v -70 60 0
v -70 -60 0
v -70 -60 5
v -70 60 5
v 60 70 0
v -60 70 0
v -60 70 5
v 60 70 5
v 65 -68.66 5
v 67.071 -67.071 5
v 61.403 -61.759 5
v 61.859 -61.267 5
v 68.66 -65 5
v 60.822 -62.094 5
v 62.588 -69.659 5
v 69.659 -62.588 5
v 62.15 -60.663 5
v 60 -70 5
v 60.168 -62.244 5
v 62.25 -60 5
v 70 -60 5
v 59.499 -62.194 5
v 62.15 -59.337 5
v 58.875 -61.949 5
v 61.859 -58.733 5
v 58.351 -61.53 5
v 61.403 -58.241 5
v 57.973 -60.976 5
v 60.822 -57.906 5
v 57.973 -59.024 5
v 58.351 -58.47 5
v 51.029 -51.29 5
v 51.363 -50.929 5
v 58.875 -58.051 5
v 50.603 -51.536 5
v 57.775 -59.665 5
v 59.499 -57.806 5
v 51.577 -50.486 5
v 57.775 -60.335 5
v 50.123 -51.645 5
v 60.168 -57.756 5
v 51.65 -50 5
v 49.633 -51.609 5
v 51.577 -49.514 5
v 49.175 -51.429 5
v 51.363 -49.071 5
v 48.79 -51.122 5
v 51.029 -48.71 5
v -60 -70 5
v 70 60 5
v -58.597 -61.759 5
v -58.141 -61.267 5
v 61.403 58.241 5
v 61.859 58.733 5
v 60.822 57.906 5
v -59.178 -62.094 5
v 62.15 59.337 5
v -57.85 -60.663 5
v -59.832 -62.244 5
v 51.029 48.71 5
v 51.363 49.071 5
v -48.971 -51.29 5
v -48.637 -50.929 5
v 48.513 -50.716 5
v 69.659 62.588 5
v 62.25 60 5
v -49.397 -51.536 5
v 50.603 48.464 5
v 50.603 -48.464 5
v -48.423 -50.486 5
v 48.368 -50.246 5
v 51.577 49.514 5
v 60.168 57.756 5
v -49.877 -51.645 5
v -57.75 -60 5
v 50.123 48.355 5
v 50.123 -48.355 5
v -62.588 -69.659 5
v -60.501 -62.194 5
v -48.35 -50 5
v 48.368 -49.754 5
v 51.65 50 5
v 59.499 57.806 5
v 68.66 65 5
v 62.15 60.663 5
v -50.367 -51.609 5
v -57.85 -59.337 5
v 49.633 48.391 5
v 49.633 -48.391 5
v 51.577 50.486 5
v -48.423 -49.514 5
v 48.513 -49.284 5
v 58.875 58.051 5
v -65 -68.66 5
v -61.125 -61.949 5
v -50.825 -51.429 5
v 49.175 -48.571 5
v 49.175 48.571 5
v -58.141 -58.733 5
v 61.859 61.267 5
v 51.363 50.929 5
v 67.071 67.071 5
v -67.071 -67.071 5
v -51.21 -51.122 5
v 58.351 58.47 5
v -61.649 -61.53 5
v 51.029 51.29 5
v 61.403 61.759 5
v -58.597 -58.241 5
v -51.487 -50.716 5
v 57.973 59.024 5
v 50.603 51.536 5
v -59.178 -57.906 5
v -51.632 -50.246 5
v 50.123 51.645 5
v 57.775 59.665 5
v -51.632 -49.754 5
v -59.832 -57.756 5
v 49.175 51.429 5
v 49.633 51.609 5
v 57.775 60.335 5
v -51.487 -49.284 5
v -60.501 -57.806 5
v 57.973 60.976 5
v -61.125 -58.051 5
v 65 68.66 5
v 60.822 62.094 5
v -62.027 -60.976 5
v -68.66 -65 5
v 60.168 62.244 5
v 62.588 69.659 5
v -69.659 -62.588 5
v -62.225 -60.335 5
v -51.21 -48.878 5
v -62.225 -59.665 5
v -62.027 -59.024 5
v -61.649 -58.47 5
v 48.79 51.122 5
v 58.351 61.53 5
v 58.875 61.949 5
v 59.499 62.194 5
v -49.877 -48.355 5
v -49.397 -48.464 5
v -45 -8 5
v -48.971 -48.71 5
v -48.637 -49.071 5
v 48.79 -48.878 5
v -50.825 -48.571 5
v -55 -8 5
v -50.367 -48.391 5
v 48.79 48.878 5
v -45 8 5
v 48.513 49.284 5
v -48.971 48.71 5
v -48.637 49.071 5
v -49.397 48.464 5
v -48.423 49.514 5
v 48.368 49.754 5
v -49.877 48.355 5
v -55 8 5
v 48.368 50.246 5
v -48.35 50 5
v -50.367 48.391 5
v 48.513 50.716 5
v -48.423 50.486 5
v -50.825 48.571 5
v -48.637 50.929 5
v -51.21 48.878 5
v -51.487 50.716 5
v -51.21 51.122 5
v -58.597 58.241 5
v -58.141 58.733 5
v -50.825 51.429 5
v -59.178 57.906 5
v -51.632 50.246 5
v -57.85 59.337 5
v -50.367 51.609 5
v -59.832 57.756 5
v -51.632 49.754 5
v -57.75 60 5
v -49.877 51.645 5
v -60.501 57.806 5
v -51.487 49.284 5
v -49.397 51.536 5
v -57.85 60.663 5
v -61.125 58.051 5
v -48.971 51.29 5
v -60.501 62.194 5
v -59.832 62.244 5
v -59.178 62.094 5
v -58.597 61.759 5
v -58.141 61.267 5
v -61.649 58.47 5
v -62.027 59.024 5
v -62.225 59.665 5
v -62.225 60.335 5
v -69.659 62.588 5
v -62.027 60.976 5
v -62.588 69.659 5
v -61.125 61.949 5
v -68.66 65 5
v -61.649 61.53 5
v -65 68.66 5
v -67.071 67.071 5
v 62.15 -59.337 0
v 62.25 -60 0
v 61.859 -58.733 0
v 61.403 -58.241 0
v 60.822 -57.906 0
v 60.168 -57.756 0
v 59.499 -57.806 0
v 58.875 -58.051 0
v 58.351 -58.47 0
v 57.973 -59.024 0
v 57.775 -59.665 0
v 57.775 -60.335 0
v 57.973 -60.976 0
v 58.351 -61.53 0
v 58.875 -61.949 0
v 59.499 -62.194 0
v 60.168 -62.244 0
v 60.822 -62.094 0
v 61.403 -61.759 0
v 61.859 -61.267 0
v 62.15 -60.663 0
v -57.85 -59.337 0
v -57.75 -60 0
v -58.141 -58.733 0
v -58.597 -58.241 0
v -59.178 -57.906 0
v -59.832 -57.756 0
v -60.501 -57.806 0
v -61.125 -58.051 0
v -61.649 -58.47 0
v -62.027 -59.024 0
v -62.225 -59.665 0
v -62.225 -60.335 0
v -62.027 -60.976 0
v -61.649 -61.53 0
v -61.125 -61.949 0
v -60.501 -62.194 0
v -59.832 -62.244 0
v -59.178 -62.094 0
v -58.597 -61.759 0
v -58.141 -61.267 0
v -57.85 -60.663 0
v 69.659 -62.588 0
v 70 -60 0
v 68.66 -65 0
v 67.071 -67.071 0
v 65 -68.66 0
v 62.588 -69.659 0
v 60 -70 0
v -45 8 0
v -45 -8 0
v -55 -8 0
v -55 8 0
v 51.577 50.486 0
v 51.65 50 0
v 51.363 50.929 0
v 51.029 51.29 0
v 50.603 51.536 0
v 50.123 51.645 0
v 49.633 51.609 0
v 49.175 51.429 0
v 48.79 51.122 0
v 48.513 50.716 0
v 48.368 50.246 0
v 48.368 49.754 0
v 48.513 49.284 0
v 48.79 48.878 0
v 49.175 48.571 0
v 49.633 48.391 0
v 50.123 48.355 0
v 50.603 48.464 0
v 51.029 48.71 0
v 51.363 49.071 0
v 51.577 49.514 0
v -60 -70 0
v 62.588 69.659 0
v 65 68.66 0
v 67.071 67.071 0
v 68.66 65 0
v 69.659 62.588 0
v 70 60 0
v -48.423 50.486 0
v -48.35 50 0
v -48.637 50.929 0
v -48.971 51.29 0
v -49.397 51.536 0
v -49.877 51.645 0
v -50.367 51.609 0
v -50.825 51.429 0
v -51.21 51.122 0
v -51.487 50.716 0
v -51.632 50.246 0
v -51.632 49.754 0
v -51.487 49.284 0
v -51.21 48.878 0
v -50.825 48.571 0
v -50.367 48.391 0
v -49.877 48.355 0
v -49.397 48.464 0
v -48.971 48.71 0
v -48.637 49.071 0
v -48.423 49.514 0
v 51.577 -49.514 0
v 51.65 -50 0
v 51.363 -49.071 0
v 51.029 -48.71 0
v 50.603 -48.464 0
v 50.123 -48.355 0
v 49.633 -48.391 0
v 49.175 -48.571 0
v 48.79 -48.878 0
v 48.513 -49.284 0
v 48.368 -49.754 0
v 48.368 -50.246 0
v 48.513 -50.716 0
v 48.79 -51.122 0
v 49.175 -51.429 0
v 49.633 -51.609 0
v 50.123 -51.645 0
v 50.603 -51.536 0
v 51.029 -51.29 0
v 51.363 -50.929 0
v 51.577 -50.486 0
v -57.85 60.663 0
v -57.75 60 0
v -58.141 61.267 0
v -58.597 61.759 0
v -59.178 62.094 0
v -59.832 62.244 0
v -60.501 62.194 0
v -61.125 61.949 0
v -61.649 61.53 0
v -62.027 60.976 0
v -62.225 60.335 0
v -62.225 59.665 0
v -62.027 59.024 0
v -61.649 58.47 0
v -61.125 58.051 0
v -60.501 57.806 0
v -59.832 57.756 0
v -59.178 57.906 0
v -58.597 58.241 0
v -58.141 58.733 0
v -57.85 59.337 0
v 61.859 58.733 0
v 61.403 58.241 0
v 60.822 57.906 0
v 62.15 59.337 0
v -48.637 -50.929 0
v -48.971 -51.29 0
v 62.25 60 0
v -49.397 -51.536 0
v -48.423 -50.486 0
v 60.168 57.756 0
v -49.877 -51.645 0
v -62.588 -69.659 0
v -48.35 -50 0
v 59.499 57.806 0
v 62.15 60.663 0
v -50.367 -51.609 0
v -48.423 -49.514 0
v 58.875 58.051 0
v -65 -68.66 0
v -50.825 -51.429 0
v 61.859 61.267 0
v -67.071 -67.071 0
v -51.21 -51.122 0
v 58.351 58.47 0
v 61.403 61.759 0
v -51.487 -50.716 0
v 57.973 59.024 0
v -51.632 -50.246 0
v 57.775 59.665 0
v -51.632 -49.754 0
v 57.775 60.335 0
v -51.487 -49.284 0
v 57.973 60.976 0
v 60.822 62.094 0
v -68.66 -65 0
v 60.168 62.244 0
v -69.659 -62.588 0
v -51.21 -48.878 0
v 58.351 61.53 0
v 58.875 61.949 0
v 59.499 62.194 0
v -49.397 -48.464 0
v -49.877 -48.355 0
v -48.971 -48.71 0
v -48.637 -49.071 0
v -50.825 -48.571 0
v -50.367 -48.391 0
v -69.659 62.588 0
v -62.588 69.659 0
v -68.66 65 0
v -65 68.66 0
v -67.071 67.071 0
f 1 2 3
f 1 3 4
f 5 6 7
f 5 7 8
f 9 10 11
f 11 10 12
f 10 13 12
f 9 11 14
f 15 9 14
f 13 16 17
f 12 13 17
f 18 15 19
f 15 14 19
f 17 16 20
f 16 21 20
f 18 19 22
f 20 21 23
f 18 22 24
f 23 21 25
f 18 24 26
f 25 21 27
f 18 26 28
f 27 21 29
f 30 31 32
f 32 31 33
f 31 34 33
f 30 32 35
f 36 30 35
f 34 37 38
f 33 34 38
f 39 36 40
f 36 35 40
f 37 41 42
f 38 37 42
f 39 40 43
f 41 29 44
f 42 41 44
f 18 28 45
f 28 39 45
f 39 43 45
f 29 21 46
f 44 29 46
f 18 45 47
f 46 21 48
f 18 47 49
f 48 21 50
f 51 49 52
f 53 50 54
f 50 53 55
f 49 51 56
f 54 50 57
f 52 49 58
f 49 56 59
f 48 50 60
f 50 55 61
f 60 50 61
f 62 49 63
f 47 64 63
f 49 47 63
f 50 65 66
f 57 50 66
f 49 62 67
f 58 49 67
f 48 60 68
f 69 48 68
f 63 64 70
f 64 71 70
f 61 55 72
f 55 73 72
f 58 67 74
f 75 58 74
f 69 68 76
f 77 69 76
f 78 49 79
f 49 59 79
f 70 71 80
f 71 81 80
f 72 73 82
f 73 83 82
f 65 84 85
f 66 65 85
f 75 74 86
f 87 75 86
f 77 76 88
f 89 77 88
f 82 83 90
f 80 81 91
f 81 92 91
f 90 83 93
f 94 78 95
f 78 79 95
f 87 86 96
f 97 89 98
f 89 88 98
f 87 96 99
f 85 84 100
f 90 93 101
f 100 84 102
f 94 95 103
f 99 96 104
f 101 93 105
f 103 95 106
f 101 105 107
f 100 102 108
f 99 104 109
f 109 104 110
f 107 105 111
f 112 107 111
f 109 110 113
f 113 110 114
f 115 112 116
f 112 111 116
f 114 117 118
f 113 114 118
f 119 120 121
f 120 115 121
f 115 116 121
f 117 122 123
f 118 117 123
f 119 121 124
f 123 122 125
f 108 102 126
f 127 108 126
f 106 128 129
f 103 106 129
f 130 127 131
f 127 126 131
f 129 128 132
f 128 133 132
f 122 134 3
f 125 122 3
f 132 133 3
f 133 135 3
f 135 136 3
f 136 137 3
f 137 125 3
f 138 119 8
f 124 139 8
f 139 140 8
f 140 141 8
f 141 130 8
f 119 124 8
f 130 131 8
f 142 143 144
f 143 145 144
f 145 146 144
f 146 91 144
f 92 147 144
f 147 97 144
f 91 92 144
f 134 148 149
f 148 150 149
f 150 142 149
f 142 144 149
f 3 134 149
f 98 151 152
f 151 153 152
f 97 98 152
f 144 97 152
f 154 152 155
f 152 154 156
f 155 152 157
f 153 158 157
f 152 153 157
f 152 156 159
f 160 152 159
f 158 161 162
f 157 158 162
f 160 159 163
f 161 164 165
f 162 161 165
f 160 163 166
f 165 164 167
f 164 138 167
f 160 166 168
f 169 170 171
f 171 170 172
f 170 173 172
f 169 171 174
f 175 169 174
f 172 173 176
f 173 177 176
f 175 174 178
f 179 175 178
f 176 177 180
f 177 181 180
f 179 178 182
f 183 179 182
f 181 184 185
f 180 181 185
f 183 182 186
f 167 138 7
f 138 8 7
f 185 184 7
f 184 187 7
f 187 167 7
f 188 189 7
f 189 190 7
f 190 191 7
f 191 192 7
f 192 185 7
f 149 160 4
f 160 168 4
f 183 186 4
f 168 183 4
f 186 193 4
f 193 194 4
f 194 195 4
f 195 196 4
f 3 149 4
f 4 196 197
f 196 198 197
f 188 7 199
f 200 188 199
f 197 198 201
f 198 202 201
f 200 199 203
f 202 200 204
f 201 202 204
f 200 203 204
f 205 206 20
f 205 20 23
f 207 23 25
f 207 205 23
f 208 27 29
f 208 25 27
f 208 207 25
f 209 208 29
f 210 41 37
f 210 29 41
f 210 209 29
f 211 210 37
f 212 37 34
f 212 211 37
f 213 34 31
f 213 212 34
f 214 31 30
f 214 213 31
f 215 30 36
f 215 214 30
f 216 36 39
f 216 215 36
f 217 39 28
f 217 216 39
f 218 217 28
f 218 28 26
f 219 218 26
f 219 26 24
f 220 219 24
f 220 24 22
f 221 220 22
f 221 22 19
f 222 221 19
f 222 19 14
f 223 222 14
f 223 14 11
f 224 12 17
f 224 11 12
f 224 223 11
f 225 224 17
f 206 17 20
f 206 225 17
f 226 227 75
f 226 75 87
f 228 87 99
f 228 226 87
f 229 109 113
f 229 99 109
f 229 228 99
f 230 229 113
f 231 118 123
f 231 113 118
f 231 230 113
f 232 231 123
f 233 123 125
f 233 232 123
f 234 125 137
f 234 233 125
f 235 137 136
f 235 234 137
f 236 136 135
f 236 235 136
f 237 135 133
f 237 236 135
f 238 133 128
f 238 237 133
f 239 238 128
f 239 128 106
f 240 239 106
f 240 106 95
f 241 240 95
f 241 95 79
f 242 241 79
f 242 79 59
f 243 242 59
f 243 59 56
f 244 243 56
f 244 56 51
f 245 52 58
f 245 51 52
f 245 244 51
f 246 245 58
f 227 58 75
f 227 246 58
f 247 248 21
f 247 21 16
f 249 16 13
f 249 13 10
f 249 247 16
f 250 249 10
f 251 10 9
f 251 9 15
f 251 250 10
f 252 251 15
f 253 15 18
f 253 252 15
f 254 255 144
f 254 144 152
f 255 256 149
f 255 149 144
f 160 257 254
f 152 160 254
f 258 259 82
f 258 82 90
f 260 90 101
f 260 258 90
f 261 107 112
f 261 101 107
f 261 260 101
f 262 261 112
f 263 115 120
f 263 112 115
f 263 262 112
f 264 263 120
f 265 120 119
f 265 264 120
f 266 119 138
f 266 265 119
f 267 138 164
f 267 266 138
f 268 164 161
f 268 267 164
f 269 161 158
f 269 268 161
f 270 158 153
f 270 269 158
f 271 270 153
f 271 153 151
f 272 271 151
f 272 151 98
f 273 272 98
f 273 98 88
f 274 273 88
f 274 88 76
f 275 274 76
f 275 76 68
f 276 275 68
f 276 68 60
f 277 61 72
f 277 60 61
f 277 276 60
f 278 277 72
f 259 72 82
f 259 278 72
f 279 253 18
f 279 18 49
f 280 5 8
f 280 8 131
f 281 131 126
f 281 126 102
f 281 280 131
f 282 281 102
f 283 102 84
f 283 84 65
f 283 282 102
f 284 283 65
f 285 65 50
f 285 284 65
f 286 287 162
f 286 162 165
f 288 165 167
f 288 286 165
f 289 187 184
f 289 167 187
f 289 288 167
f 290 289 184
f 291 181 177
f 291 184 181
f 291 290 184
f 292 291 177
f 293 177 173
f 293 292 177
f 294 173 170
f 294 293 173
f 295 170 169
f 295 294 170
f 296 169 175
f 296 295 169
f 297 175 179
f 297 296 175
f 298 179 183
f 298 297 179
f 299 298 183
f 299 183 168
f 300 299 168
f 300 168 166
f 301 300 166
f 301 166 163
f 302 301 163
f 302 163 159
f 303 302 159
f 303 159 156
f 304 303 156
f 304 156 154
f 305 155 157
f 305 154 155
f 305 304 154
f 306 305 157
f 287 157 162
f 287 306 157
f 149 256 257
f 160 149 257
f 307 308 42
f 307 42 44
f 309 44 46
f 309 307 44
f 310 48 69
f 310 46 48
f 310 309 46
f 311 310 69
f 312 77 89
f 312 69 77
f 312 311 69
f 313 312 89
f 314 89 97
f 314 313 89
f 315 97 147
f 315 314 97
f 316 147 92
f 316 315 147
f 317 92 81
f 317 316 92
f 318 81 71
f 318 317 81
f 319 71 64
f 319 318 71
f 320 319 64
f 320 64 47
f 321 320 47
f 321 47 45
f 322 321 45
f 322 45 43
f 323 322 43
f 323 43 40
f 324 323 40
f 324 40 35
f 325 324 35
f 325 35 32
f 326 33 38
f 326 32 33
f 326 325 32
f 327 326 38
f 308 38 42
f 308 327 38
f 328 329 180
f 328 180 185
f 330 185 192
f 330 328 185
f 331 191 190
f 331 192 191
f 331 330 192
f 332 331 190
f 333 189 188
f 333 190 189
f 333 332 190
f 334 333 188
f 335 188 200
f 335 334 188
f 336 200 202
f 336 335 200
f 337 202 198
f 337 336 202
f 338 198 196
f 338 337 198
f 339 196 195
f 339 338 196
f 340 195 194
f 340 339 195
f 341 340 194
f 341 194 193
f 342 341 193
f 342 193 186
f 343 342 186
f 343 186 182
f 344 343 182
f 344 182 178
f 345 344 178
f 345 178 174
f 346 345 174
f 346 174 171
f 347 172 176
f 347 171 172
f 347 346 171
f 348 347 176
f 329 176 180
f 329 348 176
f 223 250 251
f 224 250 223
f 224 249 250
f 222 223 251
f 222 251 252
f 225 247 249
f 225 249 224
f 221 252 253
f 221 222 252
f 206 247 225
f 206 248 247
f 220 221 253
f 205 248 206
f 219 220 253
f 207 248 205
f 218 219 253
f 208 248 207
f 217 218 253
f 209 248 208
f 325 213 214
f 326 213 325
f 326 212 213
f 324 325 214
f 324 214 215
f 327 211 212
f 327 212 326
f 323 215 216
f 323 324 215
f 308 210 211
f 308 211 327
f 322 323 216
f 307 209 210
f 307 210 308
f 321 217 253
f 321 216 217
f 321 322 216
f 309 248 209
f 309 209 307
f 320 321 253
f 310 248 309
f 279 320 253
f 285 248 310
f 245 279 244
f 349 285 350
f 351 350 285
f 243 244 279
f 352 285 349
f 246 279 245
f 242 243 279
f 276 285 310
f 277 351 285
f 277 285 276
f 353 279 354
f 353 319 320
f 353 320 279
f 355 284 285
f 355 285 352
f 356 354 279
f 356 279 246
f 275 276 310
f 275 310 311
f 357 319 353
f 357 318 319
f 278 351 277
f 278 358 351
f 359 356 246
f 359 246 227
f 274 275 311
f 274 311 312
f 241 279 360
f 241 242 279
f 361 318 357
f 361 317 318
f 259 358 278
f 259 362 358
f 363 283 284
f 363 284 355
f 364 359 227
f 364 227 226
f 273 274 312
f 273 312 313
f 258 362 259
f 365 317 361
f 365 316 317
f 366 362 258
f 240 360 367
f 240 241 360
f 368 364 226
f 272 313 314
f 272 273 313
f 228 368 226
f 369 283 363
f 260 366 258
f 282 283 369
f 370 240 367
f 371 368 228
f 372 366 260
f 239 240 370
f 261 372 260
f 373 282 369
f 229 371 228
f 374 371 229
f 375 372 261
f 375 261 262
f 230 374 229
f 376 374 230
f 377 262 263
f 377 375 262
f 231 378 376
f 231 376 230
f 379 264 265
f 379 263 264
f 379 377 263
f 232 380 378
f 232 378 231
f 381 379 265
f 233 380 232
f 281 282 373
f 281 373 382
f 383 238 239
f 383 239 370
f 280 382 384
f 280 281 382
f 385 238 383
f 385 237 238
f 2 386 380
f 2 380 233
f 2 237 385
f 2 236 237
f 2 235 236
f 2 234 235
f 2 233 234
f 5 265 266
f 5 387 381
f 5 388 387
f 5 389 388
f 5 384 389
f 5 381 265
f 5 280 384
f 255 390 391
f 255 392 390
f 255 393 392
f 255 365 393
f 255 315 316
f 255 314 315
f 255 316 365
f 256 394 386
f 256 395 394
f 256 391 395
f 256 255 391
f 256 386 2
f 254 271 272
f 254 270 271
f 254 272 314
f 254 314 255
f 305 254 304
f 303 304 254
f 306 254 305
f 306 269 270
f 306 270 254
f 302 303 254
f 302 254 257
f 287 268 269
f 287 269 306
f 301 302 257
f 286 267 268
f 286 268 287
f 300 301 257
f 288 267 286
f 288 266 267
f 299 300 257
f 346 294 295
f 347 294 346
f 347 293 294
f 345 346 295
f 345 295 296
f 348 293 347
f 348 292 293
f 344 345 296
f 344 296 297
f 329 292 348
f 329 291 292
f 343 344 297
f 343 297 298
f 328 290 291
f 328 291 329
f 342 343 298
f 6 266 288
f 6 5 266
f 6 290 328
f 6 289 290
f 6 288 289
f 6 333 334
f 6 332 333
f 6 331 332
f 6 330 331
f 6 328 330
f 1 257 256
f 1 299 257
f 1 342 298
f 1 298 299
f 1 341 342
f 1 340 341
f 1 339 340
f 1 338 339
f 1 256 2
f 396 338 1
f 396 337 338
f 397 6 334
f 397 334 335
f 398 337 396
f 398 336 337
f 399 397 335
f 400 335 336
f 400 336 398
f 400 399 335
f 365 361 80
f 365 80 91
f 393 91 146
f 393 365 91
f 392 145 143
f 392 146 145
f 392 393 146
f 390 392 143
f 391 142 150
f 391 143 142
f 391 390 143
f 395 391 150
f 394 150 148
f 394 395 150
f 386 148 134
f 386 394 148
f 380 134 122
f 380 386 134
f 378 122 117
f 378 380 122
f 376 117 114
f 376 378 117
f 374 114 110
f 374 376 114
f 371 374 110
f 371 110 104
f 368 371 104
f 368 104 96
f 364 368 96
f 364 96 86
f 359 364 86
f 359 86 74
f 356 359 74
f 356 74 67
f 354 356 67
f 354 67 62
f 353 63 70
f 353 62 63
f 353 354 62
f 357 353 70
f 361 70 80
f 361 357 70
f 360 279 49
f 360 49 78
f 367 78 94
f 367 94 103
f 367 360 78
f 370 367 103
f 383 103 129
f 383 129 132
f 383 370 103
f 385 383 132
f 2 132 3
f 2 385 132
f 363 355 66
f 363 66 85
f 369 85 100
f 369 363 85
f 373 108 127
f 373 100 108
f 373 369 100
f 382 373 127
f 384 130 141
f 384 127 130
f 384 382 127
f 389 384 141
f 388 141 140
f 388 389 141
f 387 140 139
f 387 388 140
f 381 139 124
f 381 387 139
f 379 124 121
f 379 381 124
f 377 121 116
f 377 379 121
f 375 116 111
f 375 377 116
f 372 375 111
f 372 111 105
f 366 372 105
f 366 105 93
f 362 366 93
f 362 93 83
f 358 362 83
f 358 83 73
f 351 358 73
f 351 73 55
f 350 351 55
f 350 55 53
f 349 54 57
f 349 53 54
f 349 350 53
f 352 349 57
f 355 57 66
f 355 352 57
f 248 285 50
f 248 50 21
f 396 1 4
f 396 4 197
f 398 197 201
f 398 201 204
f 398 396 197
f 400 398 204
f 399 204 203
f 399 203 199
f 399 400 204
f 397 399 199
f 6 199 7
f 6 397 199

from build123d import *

# Parameters (mm, degrees)
ESKIZ_KONTUR_W        = 10
ESKIZ_KONTUR_H        = 16
PLASTINA_DEPTH        = 5
OTVERSTIYA_DEPTH      = 100.121138008
OTVERSTIYA_DEPTH_BACK = 100.121138008
ESKIZ_OTVERSTIYA_R    = 2.25
ESKIZ_OTVERSTIYA_R_2  = 1.65


with BuildPart() as part:
    # Eskiz_kontur → Plastina (new body)
    with BuildSketch(Plane.XY):
        with BuildLine():
            Line((-70, -60), (-70, 60))
            ThreePointArc((-70, 60), (-67.071067812, 67.071067812), (-60, 70))
            Line((-60, 70), (60, 70))
            ThreePointArc((60, 70), (67.071067812, 67.071067812), (70, 60))
            Line((70, 60), (70, -60))
            ThreePointArc((70, -60), (67.071067812, -67.071067812), (60, -70))
            Line((60, -70), (-60, -70))
            ThreePointArc((-60, -70), (-67.071067812, -67.071067812), (-70, -60))
        make_face()
        with Locations((-50, 0)):
            Rectangle(ESKIZ_KONTUR_W, ESKIZ_KONTUR_H, mode=Mode.SUBTRACT)
    extrude(amount=PLASTINA_DEPTH)

    # Eskiz_otverstiya → Otverstiya (cut, two sides: drawn at the far end of the back side and taken through both)
    with BuildSketch(Plane.XY.offset(-OTVERSTIYA_DEPTH_BACK)):
        with Locations((-60, -60)):
            Circle(ESKIZ_OTVERSTIYA_R)
        with Locations((-50, -50)):
            Circle(ESKIZ_OTVERSTIYA_R_2)
        with Locations((60, -60)):
            Circle(ESKIZ_OTVERSTIYA_R)
        with Locations((50, -50)):
            Circle(ESKIZ_OTVERSTIYA_R_2)
        with Locations((-50, 50)):
            Circle(ESKIZ_OTVERSTIYA_R_2)
        with Locations((-60, 60)):
            Circle(ESKIZ_OTVERSTIYA_R)
        with Locations((50, 50)):
            Circle(ESKIZ_OTVERSTIYA_R_2)
        with Locations((60, 60)):
            Circle(ESKIZ_OTVERSTIYA_R)
    extrude(amount=OTVERSTIYA_DEPTH + OTVERSTIYA_DEPTH_BACK, mode=Mode.SUBTRACT)


solid = part.part
